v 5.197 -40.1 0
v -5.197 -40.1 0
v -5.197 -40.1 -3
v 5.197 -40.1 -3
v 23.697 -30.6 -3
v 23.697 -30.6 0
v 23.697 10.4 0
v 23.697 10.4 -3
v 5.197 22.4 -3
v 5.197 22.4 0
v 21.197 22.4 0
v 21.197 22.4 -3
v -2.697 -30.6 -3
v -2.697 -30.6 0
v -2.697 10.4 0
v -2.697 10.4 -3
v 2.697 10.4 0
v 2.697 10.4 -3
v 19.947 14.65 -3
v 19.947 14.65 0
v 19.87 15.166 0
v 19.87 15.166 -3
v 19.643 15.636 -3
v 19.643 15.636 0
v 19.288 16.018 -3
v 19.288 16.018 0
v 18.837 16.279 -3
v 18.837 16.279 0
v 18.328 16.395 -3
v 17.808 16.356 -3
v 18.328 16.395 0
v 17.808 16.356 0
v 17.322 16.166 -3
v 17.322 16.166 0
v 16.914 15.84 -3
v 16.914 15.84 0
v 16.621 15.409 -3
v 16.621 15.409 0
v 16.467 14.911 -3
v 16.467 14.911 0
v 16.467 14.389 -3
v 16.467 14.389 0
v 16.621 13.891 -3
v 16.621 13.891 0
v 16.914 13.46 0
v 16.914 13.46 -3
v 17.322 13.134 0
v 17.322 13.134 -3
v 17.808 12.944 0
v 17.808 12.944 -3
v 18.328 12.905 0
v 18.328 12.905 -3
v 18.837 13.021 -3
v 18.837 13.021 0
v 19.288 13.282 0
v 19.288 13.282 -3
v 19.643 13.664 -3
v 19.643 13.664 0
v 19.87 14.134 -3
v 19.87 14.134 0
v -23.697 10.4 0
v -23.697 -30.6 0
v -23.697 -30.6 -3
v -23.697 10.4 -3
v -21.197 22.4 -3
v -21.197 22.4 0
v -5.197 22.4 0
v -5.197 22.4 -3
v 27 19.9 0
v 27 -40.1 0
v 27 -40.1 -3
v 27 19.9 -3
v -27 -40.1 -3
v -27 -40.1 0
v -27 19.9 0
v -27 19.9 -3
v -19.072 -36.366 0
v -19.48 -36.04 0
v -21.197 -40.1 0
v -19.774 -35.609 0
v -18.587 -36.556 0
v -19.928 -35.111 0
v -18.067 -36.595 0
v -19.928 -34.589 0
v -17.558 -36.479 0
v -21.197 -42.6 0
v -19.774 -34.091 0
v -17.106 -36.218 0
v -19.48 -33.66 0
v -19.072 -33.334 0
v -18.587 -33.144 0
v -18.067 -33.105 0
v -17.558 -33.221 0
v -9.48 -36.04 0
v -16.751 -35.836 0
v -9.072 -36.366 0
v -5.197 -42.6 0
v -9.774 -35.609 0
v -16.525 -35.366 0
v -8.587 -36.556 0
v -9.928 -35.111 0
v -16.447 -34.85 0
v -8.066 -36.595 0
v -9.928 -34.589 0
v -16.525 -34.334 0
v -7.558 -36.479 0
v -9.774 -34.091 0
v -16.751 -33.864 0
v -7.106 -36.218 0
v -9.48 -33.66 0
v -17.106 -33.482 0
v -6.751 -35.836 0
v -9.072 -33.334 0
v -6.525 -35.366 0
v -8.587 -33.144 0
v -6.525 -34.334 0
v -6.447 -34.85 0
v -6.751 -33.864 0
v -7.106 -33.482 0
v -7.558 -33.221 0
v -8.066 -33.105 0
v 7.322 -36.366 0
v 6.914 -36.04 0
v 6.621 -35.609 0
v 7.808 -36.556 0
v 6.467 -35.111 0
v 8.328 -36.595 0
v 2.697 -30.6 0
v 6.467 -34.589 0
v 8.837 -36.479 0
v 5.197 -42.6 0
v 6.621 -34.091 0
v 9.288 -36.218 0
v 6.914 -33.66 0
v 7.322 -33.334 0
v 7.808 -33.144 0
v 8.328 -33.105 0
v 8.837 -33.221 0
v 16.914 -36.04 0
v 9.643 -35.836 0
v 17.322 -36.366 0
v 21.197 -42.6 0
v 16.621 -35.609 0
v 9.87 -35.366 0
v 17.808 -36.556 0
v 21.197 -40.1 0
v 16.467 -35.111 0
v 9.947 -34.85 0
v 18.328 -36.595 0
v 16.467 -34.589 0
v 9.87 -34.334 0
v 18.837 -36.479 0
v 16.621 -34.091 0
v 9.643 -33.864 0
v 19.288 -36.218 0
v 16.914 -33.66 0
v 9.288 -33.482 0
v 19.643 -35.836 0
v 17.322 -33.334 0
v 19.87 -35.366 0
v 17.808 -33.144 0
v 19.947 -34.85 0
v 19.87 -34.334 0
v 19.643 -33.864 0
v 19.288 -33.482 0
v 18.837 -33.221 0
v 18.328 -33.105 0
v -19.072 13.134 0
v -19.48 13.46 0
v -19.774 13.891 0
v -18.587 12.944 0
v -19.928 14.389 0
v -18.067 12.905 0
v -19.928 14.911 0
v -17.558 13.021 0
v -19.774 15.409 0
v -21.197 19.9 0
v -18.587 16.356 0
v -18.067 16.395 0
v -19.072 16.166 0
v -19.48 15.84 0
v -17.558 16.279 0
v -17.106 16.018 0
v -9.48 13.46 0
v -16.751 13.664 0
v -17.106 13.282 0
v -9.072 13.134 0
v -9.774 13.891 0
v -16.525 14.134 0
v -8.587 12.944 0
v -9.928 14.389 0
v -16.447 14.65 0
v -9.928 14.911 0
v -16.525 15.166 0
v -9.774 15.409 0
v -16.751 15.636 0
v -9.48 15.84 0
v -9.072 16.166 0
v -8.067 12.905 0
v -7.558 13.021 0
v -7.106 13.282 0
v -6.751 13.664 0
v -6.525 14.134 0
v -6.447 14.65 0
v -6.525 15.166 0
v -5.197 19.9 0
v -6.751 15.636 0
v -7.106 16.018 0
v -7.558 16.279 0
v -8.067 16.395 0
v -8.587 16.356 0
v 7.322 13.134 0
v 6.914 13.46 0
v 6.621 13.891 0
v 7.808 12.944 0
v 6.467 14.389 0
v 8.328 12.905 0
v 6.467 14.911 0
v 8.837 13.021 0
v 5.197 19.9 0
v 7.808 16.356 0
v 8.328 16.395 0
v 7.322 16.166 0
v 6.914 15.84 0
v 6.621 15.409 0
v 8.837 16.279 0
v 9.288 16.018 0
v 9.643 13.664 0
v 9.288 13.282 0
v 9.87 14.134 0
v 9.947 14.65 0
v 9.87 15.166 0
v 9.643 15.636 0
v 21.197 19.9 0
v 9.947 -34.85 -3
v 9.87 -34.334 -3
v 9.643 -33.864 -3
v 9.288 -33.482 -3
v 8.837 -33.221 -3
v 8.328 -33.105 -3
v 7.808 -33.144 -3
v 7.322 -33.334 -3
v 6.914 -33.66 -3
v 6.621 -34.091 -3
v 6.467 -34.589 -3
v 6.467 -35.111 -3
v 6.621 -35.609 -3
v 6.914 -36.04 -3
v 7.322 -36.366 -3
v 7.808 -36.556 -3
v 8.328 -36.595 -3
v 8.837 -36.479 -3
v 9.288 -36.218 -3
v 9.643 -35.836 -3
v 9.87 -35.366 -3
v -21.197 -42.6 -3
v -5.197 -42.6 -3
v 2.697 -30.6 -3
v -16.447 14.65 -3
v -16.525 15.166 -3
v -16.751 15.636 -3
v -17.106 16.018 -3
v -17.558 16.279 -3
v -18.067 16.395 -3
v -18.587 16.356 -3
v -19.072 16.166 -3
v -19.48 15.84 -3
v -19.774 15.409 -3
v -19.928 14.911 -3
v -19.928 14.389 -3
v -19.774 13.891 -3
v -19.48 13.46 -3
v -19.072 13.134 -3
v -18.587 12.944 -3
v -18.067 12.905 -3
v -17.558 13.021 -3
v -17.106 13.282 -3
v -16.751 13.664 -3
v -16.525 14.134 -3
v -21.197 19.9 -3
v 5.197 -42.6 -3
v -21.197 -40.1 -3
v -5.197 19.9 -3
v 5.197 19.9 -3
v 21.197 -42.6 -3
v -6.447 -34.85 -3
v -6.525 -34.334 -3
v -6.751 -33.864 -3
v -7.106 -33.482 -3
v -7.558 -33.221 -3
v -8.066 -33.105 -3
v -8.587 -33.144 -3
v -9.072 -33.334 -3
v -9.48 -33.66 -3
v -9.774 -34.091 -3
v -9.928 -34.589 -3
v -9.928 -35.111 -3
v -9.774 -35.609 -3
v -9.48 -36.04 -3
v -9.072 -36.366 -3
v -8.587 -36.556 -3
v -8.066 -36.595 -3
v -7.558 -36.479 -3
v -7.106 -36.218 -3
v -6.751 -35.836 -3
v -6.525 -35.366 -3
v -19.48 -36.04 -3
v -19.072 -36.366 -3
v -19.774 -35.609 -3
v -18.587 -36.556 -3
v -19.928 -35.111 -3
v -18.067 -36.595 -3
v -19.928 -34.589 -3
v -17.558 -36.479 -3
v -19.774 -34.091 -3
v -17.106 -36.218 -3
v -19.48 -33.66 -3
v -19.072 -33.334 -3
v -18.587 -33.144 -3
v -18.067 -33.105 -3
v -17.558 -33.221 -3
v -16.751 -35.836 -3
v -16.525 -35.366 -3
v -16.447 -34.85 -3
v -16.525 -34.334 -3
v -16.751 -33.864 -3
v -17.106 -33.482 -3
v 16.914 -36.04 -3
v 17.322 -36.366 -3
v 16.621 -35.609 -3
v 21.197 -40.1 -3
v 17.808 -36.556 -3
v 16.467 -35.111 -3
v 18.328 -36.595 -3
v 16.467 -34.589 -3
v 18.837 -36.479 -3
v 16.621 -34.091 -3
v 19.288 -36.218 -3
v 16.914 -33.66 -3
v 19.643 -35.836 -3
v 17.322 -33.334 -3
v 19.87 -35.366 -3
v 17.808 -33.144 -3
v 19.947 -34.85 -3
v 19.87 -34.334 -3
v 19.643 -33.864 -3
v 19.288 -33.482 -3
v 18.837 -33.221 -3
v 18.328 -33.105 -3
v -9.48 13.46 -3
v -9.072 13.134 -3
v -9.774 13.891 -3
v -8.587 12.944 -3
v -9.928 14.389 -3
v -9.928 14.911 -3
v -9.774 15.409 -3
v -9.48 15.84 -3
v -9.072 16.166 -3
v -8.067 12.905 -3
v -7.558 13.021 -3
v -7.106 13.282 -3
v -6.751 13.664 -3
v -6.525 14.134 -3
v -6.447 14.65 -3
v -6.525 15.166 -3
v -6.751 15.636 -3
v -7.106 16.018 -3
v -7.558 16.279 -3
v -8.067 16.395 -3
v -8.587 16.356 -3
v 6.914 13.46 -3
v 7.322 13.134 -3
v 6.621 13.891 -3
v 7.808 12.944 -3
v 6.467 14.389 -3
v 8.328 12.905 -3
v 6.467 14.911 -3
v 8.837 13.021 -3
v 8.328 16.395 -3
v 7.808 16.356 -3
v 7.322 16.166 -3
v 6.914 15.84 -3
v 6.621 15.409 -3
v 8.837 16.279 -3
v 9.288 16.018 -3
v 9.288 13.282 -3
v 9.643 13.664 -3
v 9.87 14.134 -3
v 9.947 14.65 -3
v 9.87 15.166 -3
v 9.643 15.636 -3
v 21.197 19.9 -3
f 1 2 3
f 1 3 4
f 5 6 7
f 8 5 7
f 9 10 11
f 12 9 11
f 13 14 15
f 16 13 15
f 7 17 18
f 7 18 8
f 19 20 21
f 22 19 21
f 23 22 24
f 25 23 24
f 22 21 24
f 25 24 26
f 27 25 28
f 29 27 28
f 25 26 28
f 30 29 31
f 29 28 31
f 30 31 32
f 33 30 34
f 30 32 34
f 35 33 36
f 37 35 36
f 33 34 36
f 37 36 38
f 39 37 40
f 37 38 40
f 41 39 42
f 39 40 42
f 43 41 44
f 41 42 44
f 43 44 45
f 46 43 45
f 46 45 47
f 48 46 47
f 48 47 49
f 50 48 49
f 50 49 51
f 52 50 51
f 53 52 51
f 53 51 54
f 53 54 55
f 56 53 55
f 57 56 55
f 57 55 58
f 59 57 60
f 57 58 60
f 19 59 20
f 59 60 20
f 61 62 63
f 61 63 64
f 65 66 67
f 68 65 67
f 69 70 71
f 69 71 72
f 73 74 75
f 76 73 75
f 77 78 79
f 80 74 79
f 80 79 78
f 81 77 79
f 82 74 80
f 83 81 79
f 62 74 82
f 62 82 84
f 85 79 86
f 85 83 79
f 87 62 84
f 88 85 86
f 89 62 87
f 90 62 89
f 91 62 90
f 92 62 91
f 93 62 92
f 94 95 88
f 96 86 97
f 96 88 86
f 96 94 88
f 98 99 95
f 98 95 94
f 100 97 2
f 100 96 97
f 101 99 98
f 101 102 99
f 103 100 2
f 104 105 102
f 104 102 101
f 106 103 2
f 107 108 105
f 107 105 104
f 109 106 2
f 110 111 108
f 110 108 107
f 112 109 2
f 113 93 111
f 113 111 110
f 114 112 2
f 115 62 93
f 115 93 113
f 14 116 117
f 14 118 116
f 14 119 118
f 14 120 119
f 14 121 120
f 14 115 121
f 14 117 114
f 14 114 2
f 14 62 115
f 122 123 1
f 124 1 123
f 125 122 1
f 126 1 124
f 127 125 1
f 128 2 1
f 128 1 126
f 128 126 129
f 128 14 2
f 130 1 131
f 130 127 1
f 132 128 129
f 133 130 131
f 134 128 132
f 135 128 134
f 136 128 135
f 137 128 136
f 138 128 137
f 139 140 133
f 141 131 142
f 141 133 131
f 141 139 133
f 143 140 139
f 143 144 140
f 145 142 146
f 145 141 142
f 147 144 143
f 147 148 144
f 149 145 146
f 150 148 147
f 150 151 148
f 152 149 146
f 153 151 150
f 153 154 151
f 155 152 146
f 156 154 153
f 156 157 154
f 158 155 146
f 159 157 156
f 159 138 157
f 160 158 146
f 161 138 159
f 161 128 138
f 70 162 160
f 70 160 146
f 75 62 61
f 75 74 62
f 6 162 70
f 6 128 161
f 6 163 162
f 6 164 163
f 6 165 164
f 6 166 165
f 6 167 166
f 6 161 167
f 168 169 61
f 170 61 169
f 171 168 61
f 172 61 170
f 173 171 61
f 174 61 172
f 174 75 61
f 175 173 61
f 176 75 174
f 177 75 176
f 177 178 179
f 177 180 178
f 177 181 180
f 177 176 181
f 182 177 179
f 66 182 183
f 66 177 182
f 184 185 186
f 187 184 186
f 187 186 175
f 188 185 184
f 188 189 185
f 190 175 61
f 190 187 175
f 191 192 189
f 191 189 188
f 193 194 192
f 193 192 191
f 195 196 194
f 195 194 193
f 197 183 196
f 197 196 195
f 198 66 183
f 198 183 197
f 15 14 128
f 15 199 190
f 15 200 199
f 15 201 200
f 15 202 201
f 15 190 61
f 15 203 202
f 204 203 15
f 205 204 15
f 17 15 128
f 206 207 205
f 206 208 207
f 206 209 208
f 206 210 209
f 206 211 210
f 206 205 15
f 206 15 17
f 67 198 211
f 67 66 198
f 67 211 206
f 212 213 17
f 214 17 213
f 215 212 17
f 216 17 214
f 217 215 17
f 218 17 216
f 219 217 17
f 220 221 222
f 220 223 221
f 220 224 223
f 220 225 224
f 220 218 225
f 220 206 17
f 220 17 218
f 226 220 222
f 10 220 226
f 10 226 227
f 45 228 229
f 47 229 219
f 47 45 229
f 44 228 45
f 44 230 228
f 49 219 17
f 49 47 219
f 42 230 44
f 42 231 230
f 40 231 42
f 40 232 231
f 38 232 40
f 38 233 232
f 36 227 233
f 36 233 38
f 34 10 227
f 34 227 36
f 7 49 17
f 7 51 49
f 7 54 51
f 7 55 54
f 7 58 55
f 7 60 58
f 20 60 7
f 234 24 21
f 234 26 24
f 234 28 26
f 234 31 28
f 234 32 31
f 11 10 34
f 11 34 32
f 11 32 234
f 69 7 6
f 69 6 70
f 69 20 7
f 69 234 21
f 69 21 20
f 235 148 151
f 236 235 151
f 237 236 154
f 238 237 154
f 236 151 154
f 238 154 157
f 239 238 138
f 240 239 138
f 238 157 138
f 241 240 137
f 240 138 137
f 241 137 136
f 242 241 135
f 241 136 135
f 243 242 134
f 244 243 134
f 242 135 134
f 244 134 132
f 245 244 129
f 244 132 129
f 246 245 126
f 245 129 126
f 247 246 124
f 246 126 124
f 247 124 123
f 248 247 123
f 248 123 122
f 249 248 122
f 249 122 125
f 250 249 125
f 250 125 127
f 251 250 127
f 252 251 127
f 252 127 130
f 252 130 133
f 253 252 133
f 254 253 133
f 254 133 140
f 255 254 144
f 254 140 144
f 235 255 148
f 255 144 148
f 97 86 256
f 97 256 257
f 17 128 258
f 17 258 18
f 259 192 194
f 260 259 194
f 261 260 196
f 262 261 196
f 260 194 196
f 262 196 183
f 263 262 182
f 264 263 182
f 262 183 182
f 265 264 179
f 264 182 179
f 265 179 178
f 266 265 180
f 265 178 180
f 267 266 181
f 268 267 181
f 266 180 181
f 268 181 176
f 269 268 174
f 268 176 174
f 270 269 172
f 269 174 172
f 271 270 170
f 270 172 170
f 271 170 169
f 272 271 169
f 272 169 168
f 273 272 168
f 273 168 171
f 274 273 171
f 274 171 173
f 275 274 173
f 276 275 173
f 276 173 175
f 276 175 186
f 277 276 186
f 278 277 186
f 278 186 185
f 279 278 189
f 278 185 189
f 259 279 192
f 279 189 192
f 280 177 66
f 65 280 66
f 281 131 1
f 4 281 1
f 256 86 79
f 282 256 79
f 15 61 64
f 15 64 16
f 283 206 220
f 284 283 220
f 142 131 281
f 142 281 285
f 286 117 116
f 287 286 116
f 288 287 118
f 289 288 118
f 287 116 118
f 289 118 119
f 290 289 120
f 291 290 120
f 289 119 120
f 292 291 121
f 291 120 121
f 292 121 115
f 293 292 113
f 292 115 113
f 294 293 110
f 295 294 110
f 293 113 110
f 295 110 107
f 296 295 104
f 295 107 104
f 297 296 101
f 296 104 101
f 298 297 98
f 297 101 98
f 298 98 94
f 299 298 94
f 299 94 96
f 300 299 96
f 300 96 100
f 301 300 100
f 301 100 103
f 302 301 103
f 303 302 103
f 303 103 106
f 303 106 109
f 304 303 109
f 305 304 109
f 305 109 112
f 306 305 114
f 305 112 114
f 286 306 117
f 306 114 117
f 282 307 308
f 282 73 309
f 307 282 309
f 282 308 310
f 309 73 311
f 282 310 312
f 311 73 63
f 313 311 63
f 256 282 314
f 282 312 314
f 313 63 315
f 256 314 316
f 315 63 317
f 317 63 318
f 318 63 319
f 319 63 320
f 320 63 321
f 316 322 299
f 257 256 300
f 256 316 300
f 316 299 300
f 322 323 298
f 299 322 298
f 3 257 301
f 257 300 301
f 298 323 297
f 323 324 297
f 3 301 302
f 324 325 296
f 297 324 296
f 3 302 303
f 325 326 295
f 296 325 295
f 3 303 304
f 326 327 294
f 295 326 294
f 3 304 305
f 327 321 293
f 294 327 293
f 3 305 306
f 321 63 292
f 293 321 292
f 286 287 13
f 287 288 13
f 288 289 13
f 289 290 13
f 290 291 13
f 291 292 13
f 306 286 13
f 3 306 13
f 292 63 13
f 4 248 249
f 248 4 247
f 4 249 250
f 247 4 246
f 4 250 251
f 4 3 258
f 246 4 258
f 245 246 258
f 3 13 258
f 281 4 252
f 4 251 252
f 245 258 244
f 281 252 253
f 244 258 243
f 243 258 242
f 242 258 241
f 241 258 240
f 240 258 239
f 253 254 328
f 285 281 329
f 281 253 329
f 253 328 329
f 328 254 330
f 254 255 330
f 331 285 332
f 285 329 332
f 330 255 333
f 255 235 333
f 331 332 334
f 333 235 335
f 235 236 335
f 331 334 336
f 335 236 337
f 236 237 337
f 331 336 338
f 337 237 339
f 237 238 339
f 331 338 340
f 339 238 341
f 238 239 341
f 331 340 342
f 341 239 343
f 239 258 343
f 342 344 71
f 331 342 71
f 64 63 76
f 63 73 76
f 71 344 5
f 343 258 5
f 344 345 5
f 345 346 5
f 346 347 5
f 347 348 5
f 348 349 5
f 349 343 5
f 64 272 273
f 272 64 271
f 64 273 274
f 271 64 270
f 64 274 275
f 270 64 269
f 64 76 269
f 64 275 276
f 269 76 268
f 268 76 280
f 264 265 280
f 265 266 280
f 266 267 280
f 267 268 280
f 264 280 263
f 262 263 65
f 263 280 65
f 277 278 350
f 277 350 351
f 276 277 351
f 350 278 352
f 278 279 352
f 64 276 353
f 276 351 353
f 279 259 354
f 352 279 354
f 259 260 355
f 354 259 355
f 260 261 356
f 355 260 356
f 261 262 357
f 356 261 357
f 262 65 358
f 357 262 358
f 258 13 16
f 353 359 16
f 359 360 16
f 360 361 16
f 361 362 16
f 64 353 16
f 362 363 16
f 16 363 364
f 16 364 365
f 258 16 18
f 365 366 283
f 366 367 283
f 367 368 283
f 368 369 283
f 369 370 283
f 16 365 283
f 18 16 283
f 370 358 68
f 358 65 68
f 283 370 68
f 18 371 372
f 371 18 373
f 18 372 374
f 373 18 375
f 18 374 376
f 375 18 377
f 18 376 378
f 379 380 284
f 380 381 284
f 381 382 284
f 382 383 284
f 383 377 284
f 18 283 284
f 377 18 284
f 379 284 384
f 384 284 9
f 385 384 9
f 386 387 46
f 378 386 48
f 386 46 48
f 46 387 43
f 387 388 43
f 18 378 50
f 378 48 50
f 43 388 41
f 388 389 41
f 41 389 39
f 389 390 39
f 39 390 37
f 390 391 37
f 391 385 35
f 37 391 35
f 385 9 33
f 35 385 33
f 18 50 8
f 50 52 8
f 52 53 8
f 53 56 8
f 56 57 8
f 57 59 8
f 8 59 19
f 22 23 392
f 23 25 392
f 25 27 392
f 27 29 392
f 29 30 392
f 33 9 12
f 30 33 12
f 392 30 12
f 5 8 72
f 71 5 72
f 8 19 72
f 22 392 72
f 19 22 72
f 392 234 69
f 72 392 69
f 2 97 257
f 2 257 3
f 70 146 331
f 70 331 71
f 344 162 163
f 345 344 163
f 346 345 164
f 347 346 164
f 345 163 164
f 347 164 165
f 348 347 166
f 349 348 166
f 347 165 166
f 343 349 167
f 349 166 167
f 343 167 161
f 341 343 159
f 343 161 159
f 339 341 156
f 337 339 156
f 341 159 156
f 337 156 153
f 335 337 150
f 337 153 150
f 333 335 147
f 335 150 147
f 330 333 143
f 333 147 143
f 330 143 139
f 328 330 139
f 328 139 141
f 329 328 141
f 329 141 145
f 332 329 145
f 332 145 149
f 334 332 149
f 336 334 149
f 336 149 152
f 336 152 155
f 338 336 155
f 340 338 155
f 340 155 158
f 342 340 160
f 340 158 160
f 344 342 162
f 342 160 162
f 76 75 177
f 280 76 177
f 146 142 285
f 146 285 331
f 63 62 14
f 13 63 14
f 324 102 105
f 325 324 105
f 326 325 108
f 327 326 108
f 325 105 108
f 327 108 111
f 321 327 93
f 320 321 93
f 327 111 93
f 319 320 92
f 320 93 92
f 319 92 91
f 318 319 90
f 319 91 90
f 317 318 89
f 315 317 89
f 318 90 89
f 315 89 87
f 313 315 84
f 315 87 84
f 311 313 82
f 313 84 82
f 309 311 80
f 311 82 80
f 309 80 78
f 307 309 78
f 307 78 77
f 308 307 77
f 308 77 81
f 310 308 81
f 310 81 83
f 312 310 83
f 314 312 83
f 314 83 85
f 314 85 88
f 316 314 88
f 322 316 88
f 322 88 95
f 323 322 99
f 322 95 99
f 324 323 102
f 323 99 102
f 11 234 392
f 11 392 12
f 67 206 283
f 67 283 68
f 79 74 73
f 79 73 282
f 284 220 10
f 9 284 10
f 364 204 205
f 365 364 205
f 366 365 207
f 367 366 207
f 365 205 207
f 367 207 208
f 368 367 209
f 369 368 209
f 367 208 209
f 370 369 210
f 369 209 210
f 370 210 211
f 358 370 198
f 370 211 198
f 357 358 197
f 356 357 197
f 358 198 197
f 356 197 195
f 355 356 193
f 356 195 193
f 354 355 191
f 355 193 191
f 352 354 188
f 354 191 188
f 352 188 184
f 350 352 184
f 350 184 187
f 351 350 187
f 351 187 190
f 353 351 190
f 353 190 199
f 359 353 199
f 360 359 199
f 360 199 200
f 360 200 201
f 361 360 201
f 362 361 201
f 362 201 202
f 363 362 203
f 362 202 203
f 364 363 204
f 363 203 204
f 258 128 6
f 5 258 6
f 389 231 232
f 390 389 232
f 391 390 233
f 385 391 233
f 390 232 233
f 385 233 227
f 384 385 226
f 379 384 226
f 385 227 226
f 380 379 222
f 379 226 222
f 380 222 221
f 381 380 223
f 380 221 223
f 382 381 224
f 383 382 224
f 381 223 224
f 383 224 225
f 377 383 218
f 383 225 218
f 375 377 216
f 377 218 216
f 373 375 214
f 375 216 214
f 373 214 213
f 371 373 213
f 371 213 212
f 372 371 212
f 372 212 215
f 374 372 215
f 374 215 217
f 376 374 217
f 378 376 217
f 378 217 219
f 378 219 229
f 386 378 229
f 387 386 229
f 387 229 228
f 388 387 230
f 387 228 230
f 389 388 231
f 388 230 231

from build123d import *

# Parameters (mm, degrees)
SKETCH_1_W      = 54
SKETCH_1_H      = 60
SKETCH_1_R      = 1.75
SKETCH_1_W_2    = 21
SKETCH_1_H_2    = 41
SKETCH_1_W_3    = 16
SKETCH_1_H_3    = 2.5
EXTRUDE_1_DEPTH = 3


with BuildPart() as part:
    # Эскиз1 → Бобышка-Вытянуть1 (new body)
    with BuildSketch(Plane.XY):
        with Locations((0, -10.1)):
            Rectangle(SKETCH_1_W, SKETCH_1_H)
        with Locations((-18.19729, 14.65)):
            Circle(SKETCH_1_R, mode=Mode.SUBTRACT)
        with Locations((-8.19729, 14.65)):
            Circle(SKETCH_1_R, mode=Mode.SUBTRACT)
        with Locations((8.19729, 14.65)):
            Circle(SKETCH_1_R, mode=Mode.SUBTRACT)
        with Locations((18.19729, 14.65)):
            Circle(SKETCH_1_R, mode=Mode.SUBTRACT)
        with Locations((18.19729, -34.85)):
            Circle(SKETCH_1_R, mode=Mode.SUBTRACT)
        with Locations((8.19729, -34.85)):
            Circle(SKETCH_1_R, mode=Mode.SUBTRACT)
        with Locations((-8.197262, -34.85)):
            Circle(SKETCH_1_R, mode=Mode.SUBTRACT)
        with Locations((-18.19729, -34.85)):
            Circle(SKETCH_1_R, mode=Mode.SUBTRACT)
        with Locations((-13.19729, -10.1)):
            Rectangle(SKETCH_1_W_2, SKETCH_1_H_2, mode=Mode.SUBTRACT)
        with Locations((13.19729, -10.1)):
            Rectangle(SKETCH_1_W_2, SKETCH_1_H_2, mode=Mode.SUBTRACT)
        with Locations((-13.19729, 21.15)):
            Rectangle(SKETCH_1_W_3, SKETCH_1_H_3)
        with Locations((13.19729, 21.15)):
            Rectangle(SKETCH_1_W_3, SKETCH_1_H_3)
        with Locations((13.19729, -41.35)):
            Rectangle(SKETCH_1_W_3, SKETCH_1_H_3)
        with Locations((-13.19729, -41.35)):
            Rectangle(SKETCH_1_W_3, SKETCH_1_H_3)
    extrude(amount=-EXTRUDE_1_DEPTH)


solid = part.part
